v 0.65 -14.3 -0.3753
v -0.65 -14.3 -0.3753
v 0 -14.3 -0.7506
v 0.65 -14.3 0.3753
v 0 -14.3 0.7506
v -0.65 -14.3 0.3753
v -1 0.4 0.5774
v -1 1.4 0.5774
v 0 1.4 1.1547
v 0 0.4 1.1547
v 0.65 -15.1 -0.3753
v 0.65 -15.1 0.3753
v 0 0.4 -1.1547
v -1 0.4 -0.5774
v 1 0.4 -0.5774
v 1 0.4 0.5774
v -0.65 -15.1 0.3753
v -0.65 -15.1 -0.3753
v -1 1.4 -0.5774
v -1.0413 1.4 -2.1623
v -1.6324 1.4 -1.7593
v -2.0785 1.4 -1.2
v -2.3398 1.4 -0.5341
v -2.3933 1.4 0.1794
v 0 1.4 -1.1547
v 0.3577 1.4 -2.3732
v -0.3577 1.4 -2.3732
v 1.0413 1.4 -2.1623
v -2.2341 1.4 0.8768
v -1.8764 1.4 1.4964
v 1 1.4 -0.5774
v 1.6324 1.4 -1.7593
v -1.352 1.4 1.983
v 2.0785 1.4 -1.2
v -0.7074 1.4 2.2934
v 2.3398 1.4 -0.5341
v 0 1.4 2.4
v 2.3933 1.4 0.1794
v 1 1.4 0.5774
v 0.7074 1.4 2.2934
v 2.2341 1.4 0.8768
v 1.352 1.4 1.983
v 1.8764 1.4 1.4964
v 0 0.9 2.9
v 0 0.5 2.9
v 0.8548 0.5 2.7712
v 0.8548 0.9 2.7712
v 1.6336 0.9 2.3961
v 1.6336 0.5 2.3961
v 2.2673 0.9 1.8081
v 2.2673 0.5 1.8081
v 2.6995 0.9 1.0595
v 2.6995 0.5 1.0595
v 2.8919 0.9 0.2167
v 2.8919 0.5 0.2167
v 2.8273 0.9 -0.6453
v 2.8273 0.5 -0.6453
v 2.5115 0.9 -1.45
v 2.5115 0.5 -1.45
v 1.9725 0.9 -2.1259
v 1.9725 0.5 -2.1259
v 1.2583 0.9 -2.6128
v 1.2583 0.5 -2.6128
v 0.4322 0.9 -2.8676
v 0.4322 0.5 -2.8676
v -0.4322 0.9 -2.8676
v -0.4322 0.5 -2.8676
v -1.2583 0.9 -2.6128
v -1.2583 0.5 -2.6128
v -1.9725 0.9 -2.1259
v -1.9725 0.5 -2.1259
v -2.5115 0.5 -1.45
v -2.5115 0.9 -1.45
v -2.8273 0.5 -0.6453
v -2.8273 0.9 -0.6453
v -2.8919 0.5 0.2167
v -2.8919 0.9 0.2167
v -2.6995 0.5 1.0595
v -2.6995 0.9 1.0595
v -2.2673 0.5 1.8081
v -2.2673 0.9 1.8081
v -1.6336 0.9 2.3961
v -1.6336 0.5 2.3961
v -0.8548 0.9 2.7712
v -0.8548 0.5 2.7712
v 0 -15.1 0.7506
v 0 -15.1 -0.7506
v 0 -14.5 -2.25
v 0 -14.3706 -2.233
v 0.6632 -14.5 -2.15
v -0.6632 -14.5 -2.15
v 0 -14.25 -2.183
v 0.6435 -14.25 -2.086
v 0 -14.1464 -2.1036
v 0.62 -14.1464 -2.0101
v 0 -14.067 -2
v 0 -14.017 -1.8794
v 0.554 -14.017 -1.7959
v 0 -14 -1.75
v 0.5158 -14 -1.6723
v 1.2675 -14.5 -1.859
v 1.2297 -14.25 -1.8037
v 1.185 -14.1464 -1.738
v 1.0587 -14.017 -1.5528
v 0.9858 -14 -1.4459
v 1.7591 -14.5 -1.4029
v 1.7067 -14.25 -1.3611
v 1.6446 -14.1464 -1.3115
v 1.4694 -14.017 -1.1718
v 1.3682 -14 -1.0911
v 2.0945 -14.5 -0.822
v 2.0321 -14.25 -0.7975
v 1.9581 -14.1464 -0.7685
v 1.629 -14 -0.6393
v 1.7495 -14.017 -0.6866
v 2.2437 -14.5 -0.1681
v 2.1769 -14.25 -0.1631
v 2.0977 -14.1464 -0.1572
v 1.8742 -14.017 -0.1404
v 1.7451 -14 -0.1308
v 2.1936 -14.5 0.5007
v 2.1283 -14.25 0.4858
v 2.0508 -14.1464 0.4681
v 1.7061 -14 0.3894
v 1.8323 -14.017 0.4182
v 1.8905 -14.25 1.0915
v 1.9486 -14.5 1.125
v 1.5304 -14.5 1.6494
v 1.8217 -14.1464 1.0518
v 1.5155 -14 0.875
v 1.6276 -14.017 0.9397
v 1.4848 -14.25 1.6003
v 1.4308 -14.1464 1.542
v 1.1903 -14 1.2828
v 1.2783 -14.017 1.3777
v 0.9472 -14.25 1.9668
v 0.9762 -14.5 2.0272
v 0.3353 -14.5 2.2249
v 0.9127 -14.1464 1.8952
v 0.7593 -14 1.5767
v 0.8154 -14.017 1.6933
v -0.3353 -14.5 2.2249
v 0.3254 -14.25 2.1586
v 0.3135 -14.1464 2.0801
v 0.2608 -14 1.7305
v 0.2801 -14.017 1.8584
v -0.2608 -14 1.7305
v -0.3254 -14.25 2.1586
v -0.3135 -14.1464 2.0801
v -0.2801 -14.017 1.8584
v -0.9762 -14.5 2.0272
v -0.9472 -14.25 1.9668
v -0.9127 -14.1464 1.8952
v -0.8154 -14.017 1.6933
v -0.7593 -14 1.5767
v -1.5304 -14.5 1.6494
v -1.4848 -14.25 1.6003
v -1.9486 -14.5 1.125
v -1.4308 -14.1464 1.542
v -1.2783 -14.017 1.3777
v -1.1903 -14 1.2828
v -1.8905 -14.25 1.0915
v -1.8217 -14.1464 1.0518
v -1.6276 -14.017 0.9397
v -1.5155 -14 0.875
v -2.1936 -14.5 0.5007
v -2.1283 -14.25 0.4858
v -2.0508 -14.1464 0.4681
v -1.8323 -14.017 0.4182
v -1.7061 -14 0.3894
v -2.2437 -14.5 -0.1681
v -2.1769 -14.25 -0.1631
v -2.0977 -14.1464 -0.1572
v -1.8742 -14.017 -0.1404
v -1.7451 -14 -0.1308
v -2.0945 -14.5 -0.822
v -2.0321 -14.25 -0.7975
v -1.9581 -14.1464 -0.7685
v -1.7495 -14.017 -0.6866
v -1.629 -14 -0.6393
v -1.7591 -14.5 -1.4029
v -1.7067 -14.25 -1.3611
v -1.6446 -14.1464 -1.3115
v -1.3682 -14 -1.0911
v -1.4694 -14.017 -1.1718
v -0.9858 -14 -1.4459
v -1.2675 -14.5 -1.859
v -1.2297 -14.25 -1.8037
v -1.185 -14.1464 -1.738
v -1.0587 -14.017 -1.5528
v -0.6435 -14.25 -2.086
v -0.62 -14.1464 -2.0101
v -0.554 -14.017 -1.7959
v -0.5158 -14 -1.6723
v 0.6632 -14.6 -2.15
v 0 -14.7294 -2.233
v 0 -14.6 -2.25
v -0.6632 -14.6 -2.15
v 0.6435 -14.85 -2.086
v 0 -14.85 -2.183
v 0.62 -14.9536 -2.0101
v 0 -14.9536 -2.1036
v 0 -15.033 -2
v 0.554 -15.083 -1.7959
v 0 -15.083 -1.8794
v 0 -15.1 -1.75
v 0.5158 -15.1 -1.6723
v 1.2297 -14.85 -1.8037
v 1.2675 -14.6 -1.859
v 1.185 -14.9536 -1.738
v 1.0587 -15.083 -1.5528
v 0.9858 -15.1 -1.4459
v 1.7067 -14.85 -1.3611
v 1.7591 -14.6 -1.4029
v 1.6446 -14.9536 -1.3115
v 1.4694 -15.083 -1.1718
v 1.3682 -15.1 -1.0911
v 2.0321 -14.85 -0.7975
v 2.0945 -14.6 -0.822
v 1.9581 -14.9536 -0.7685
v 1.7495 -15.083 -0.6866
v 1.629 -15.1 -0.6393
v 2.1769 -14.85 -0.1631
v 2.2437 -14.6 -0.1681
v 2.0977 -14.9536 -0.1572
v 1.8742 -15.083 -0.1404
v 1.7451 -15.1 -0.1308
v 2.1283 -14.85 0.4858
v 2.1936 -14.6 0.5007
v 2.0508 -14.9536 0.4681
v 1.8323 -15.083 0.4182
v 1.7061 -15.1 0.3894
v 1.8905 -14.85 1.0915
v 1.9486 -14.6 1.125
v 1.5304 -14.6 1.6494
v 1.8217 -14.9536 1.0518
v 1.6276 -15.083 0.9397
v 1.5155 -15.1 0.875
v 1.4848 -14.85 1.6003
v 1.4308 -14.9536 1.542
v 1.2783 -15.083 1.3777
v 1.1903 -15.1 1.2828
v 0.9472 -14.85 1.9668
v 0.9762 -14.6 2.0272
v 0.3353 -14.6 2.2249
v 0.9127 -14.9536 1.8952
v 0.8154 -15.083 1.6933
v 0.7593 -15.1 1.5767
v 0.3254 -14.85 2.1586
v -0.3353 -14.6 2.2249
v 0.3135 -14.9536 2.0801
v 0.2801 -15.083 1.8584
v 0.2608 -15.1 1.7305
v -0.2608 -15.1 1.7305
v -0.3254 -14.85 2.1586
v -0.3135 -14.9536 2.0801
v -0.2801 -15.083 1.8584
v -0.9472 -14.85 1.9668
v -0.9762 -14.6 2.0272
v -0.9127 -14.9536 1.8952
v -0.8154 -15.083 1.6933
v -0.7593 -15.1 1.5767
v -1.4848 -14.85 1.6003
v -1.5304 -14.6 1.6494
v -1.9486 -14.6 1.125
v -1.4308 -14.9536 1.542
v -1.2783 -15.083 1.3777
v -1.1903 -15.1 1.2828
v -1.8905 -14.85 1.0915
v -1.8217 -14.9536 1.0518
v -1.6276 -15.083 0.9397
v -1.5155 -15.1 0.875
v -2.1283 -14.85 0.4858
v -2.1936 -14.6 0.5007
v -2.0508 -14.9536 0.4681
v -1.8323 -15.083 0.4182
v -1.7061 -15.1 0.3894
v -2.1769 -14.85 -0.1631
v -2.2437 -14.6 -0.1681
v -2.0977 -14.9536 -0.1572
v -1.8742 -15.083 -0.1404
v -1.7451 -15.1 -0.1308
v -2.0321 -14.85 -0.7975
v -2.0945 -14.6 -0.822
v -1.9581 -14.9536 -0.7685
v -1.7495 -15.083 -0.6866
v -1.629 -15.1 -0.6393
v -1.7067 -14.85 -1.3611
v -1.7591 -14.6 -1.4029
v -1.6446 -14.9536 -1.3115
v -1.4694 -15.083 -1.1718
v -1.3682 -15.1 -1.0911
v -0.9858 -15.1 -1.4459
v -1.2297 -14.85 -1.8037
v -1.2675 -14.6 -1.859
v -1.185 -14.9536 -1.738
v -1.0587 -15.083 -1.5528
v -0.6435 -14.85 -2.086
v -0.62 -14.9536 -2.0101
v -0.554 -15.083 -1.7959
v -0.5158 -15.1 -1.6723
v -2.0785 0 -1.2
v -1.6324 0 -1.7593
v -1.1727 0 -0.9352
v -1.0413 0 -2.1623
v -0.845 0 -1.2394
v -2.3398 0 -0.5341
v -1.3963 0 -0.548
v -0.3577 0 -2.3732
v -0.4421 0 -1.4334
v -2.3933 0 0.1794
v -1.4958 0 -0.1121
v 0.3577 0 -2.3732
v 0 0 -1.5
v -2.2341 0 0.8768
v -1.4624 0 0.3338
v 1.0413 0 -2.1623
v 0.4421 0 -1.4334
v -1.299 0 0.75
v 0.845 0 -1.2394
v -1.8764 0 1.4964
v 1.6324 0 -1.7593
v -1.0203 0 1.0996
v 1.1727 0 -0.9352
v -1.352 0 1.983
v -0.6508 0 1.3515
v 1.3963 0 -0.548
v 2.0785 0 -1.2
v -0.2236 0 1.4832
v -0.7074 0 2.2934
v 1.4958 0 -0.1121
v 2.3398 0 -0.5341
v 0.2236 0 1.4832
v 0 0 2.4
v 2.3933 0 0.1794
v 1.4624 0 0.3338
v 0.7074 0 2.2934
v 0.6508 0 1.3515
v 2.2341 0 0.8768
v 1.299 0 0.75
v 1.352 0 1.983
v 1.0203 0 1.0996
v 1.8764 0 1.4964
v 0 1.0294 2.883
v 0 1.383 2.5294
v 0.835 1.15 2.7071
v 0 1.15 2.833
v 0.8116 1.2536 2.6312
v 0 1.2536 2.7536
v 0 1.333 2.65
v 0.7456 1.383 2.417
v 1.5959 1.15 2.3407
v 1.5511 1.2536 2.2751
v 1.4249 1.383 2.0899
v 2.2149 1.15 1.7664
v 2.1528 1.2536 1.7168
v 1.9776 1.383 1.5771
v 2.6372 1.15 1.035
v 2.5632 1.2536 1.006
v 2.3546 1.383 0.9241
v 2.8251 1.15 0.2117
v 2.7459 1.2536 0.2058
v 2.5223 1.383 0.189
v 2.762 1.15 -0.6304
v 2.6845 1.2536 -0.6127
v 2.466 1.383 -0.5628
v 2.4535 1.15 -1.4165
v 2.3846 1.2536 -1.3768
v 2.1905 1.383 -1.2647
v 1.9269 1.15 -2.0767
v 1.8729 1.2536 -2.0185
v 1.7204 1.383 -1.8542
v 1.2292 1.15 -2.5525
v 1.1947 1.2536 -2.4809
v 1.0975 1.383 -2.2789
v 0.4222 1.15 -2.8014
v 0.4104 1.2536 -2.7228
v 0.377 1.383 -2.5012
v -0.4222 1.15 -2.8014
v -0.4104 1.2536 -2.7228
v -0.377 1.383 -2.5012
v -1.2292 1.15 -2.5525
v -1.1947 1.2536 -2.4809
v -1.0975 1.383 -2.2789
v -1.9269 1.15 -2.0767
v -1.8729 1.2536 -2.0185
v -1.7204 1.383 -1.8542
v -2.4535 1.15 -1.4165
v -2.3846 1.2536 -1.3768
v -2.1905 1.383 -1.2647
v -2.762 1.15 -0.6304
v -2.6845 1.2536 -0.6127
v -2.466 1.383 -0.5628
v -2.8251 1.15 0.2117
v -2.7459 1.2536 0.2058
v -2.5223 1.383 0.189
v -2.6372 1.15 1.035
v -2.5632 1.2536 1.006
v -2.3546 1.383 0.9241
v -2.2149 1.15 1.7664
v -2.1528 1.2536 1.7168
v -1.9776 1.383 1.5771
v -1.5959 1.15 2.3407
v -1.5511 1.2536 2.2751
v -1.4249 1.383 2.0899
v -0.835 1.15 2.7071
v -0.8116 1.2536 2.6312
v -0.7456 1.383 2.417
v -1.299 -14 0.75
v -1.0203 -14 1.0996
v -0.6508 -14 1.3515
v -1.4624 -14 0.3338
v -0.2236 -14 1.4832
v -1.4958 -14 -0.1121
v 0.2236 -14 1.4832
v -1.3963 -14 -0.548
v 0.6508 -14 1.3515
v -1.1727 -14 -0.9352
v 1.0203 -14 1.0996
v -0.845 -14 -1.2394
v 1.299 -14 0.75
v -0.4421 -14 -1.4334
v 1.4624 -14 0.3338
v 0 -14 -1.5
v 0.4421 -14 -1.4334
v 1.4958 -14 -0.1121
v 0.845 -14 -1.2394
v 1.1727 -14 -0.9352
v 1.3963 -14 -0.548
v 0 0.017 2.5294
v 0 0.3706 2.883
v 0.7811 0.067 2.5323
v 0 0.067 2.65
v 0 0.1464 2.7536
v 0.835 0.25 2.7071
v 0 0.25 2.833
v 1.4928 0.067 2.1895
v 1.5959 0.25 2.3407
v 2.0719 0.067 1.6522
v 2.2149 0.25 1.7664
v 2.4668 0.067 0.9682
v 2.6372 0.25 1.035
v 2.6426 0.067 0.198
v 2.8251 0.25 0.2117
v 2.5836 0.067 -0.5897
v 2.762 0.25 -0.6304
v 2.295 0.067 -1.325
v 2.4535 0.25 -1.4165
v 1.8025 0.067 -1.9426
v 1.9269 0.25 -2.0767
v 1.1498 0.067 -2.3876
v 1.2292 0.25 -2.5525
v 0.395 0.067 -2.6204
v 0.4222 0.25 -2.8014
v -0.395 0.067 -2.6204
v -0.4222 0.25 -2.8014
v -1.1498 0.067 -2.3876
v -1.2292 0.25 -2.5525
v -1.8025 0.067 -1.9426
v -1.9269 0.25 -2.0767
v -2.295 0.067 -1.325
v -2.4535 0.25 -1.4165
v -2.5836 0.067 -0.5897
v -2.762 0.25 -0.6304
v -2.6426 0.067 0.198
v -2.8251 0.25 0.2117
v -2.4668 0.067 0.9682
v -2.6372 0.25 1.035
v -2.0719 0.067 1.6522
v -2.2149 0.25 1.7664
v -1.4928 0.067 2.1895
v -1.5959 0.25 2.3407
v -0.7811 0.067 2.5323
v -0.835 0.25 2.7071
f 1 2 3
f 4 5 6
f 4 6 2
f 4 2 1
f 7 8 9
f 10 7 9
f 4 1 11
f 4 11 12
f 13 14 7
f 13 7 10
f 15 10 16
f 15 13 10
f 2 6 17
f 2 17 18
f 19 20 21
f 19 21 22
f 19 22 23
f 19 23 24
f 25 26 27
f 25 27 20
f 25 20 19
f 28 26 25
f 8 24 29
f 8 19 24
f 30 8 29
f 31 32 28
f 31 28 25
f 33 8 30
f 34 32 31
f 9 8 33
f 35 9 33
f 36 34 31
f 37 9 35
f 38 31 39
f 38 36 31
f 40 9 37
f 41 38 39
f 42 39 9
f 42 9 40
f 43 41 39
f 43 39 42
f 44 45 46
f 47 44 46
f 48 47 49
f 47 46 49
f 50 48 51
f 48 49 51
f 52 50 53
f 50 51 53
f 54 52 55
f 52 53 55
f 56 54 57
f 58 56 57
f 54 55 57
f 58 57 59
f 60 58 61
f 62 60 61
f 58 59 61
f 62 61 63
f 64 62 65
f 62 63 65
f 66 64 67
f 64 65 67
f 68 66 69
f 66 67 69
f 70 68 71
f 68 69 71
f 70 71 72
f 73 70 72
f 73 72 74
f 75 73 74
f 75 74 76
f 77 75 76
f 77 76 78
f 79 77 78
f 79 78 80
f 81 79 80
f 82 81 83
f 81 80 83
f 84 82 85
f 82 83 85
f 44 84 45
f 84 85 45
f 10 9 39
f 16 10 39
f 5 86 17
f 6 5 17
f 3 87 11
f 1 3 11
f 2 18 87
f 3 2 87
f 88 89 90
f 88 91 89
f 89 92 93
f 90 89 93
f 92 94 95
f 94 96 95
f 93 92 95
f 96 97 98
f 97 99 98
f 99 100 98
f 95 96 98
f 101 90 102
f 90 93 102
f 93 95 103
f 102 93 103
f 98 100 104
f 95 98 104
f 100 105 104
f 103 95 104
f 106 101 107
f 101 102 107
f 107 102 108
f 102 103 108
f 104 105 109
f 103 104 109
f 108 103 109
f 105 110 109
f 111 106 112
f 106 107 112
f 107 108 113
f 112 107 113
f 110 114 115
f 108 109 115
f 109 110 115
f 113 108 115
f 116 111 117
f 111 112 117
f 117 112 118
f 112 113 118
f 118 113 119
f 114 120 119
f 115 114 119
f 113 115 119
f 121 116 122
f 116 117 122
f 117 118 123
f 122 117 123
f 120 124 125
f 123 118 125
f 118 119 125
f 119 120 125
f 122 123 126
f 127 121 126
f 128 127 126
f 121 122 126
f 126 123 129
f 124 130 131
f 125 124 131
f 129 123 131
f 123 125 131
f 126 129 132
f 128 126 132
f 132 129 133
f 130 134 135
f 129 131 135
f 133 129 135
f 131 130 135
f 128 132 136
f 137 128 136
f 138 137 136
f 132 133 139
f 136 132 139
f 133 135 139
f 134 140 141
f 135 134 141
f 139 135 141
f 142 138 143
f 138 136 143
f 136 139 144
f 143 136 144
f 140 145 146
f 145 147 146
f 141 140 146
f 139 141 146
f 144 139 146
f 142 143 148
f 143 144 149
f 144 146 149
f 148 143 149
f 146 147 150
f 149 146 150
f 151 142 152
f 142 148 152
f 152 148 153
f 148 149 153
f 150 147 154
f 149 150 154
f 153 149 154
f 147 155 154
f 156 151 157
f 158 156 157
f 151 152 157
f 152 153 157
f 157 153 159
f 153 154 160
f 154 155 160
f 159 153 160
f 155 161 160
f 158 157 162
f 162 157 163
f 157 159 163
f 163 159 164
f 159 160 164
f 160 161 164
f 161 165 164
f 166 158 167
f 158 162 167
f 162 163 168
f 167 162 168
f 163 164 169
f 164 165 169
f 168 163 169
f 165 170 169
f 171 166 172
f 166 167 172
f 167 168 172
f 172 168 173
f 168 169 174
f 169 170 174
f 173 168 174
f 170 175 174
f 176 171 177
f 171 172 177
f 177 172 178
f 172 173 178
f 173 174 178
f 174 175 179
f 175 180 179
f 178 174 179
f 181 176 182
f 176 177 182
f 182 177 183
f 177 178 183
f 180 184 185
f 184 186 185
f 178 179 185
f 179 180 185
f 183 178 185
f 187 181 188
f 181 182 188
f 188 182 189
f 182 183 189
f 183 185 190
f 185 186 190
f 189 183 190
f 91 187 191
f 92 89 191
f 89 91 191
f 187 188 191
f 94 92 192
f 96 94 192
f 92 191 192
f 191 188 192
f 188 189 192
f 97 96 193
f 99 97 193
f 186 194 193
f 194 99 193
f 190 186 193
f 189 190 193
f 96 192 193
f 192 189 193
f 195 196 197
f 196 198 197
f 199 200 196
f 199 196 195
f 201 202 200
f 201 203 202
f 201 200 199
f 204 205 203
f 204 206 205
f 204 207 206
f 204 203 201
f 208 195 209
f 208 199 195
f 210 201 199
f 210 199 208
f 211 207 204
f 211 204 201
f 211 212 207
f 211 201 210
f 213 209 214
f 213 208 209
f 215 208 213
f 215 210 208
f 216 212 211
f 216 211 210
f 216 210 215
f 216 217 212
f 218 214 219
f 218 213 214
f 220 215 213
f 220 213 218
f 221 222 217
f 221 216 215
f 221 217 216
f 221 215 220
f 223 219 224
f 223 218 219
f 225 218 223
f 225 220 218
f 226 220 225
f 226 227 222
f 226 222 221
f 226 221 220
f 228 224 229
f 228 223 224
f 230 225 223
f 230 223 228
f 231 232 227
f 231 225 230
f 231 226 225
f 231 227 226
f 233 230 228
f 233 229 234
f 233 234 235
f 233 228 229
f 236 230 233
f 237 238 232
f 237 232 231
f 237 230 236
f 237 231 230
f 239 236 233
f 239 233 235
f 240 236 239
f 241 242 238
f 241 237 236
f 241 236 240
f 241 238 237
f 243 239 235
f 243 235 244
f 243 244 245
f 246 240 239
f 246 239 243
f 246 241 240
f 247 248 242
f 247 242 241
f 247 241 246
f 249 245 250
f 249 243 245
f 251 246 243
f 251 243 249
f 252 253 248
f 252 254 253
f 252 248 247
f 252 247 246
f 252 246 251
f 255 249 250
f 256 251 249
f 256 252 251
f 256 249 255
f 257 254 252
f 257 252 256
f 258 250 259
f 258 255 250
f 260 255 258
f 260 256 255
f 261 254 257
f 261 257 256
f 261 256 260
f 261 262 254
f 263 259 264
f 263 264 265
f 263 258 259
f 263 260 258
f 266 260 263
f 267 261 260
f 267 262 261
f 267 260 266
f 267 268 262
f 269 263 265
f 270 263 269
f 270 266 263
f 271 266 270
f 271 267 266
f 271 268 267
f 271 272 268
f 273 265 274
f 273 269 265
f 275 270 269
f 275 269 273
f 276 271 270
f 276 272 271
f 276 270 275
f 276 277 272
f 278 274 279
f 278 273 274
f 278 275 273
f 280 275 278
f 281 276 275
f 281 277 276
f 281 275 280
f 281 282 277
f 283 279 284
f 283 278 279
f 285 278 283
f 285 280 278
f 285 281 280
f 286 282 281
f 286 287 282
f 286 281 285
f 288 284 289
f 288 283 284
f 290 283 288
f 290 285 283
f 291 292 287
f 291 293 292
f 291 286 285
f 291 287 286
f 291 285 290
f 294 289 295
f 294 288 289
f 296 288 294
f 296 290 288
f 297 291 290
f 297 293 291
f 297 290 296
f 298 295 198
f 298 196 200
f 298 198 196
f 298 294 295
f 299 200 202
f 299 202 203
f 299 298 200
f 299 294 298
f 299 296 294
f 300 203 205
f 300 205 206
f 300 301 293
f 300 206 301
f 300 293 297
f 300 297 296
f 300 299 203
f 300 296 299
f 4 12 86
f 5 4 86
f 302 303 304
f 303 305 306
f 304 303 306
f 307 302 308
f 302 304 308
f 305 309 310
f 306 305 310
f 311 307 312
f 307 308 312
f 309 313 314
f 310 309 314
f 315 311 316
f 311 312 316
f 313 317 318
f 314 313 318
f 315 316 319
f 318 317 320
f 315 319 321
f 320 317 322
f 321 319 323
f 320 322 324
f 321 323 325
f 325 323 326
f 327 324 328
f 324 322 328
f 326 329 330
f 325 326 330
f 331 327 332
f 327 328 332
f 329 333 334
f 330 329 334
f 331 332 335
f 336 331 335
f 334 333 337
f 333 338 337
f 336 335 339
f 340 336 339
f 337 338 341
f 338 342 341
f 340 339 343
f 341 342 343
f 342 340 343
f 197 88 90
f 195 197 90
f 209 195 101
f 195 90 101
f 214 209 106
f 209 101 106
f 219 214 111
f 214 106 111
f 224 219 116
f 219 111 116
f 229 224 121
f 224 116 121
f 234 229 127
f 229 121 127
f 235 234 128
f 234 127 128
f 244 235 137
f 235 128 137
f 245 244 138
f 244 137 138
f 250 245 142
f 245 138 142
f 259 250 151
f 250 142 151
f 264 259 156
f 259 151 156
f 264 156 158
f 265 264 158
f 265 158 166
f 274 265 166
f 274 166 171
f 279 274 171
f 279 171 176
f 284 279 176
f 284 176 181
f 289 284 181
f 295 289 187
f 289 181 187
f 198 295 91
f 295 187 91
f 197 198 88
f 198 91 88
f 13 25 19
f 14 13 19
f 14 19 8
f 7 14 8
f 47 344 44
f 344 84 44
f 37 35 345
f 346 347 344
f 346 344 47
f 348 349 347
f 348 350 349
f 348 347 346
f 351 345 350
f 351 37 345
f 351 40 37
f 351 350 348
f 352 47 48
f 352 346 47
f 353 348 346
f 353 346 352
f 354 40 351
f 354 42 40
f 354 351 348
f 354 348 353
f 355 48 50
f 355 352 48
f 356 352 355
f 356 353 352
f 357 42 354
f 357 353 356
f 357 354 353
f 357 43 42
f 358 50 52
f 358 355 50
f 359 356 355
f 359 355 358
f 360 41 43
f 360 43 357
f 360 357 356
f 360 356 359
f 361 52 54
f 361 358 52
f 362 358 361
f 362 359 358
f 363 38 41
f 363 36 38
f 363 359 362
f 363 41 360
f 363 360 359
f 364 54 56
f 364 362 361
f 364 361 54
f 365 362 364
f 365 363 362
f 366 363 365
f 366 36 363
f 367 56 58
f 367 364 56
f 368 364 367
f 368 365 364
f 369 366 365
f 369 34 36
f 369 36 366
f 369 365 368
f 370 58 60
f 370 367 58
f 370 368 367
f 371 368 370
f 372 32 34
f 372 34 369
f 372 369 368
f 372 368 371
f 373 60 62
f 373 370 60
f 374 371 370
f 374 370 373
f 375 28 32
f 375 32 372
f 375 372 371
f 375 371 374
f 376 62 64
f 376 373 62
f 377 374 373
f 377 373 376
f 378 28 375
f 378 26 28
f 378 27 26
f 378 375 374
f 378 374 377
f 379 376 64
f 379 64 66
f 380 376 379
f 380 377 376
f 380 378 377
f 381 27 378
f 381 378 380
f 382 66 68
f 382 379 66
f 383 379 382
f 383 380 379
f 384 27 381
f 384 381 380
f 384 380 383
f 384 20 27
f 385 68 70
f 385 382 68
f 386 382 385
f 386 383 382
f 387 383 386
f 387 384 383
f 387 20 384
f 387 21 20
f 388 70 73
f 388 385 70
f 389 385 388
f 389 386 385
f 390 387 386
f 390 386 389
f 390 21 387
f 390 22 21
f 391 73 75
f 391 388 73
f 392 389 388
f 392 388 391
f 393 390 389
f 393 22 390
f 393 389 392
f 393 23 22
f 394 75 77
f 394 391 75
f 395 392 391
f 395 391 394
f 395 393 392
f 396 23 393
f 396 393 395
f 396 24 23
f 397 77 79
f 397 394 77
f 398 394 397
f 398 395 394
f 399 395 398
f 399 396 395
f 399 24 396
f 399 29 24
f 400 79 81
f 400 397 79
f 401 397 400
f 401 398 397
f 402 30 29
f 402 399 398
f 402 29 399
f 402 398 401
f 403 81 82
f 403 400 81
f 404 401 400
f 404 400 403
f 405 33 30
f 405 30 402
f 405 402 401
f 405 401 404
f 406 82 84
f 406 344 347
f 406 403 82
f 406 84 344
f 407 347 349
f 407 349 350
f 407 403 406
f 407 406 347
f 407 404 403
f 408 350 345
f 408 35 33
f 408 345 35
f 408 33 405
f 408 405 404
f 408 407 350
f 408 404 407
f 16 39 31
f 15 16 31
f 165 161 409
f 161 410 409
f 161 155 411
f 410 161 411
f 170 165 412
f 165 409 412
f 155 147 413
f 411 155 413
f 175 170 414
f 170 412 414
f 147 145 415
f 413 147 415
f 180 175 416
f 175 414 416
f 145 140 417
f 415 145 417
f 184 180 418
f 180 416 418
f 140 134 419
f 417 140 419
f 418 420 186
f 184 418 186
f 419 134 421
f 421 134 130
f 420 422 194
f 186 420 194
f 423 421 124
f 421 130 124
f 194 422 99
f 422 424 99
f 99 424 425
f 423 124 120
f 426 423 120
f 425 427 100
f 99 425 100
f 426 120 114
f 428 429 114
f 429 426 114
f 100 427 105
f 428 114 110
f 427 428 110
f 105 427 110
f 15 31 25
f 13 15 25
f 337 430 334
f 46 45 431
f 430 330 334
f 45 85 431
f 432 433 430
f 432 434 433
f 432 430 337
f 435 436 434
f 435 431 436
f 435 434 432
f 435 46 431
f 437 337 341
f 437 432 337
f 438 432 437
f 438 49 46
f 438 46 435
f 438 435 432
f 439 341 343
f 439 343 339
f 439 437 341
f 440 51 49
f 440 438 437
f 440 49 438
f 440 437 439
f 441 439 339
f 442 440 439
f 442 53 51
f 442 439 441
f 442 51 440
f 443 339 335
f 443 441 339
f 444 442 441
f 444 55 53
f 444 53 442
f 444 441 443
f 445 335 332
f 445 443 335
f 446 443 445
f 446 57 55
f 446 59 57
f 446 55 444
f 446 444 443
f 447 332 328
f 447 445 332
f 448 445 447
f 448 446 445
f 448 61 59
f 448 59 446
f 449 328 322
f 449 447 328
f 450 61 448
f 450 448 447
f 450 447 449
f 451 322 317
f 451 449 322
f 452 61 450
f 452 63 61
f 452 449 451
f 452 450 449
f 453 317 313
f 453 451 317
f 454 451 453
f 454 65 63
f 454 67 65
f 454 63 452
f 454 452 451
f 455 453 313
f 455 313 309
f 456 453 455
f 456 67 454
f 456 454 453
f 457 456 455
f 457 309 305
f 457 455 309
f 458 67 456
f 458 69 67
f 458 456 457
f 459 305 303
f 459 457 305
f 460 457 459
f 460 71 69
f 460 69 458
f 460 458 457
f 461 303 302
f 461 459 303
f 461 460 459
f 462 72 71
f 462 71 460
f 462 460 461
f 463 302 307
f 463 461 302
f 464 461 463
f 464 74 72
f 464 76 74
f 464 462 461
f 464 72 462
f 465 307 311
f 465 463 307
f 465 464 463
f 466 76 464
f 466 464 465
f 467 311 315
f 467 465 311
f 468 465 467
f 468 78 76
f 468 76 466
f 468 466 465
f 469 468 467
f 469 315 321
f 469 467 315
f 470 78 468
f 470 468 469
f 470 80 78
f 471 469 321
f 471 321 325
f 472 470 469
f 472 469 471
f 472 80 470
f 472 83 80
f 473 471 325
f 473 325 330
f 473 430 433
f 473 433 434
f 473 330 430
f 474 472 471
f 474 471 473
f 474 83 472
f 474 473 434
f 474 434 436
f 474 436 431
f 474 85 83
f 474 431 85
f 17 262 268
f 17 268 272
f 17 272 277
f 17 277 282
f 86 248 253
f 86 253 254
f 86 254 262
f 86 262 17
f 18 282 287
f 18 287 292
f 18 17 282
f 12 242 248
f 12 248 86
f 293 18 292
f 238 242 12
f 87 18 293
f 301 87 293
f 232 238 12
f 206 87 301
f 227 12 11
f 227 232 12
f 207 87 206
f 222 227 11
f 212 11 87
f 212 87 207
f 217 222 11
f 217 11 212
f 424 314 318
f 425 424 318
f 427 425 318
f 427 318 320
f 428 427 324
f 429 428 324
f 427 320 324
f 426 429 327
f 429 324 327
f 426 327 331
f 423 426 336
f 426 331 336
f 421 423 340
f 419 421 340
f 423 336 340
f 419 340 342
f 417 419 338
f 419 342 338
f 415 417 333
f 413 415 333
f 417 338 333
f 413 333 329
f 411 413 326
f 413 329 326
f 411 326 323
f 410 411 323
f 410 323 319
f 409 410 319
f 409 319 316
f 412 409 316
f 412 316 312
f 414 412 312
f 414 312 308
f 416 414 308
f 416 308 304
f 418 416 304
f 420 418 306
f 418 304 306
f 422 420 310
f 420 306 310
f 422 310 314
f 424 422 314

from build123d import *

# Parameters (mm, degrees)
SKETCH_1_R          = 2.9
EXTRUDE_1_DEPTH     = 1.4
CUT_EXTRUDE_1_DEPTH = 1
SKETCH_3_R          = 1.5
EXTRUDE_2_DEPTH     = 14
SKETCH_4_R          = 2.25
EXTRUDE_3_DEPTH     = 1.1
CUT_EXTRUDE_2_DEPTH = 0.8
FILLET_1_R          = 0.5


with BuildPart() as part:
    # 草图1 → 凸台-拉伸1 (new body)
    with BuildSketch(Plane(origin=(0, 0, 0), x_dir=(1, 0, 0), z_dir=(0, 1, 0))):
        with Locations(Location((0, 0, 0), (0, 0, 270))):
            Circle(SKETCH_1_R)
    extrude(amount=EXTRUDE_1_DEPTH)

    # 草图2 → 切除-拉伸1 (cut)
    with BuildSketch(Plane(origin=(0, 1.4, 0), x_dir=(1, 0, 0), z_dir=(0, 1, 0))):
        Polygon((1, 0.577350269), (0, 1.154700538), (-1, 0.577350269), (-1, -0.577350269), (0, -1.154700538), (1, -0.577350269), align=None)
    extrude(amount=-CUT_EXTRUDE_1_DEPTH, mode=Mode.SUBTRACT)

    # 草图3 → 凸台-拉伸2 (add)
    with BuildSketch(Plane.XZ):
        with Locations(Location((0, 0, 0), (0, 0, 270))):
            Circle(SKETCH_3_R)
    extrude(amount=EXTRUDE_2_DEPTH)

    # 草图4 → 凸台-拉伸3 (add)
    with BuildSketch(Plane.XZ.offset(14)):
        with Locations(Location((0, 0, 0), (0, 0, 270))):
            Circle(SKETCH_4_R)
    extrude(amount=EXTRUDE_3_DEPTH)

    # 草图5 → 切除-拉伸2 (cut)
    with BuildSketch(Plane.XZ.offset(15.1)):
        Polygon((0.65, 0.375277675), (0, 0.75055535), (-0.65, 0.375277675), (-0.65, -0.375277675), (0, -0.75055535), (0.65, -0.375277675), align=None)
    extrude(amount=-CUT_EXTRUDE_2_DEPTH, mode=Mode.SUBTRACT)

    # 圆角1
    fillet_1_edges = [part.edges().sort_by_distance(p)[0] for p in [
        (0, 0, -2.9),
        (0, -14, 2.25),
        (0, -15.1, 2.25),
        (0, 1.4, -2.9),
    ]]
    fillet(fillet_1_edges, radius=FILLET_1_R)


solid = part.part
